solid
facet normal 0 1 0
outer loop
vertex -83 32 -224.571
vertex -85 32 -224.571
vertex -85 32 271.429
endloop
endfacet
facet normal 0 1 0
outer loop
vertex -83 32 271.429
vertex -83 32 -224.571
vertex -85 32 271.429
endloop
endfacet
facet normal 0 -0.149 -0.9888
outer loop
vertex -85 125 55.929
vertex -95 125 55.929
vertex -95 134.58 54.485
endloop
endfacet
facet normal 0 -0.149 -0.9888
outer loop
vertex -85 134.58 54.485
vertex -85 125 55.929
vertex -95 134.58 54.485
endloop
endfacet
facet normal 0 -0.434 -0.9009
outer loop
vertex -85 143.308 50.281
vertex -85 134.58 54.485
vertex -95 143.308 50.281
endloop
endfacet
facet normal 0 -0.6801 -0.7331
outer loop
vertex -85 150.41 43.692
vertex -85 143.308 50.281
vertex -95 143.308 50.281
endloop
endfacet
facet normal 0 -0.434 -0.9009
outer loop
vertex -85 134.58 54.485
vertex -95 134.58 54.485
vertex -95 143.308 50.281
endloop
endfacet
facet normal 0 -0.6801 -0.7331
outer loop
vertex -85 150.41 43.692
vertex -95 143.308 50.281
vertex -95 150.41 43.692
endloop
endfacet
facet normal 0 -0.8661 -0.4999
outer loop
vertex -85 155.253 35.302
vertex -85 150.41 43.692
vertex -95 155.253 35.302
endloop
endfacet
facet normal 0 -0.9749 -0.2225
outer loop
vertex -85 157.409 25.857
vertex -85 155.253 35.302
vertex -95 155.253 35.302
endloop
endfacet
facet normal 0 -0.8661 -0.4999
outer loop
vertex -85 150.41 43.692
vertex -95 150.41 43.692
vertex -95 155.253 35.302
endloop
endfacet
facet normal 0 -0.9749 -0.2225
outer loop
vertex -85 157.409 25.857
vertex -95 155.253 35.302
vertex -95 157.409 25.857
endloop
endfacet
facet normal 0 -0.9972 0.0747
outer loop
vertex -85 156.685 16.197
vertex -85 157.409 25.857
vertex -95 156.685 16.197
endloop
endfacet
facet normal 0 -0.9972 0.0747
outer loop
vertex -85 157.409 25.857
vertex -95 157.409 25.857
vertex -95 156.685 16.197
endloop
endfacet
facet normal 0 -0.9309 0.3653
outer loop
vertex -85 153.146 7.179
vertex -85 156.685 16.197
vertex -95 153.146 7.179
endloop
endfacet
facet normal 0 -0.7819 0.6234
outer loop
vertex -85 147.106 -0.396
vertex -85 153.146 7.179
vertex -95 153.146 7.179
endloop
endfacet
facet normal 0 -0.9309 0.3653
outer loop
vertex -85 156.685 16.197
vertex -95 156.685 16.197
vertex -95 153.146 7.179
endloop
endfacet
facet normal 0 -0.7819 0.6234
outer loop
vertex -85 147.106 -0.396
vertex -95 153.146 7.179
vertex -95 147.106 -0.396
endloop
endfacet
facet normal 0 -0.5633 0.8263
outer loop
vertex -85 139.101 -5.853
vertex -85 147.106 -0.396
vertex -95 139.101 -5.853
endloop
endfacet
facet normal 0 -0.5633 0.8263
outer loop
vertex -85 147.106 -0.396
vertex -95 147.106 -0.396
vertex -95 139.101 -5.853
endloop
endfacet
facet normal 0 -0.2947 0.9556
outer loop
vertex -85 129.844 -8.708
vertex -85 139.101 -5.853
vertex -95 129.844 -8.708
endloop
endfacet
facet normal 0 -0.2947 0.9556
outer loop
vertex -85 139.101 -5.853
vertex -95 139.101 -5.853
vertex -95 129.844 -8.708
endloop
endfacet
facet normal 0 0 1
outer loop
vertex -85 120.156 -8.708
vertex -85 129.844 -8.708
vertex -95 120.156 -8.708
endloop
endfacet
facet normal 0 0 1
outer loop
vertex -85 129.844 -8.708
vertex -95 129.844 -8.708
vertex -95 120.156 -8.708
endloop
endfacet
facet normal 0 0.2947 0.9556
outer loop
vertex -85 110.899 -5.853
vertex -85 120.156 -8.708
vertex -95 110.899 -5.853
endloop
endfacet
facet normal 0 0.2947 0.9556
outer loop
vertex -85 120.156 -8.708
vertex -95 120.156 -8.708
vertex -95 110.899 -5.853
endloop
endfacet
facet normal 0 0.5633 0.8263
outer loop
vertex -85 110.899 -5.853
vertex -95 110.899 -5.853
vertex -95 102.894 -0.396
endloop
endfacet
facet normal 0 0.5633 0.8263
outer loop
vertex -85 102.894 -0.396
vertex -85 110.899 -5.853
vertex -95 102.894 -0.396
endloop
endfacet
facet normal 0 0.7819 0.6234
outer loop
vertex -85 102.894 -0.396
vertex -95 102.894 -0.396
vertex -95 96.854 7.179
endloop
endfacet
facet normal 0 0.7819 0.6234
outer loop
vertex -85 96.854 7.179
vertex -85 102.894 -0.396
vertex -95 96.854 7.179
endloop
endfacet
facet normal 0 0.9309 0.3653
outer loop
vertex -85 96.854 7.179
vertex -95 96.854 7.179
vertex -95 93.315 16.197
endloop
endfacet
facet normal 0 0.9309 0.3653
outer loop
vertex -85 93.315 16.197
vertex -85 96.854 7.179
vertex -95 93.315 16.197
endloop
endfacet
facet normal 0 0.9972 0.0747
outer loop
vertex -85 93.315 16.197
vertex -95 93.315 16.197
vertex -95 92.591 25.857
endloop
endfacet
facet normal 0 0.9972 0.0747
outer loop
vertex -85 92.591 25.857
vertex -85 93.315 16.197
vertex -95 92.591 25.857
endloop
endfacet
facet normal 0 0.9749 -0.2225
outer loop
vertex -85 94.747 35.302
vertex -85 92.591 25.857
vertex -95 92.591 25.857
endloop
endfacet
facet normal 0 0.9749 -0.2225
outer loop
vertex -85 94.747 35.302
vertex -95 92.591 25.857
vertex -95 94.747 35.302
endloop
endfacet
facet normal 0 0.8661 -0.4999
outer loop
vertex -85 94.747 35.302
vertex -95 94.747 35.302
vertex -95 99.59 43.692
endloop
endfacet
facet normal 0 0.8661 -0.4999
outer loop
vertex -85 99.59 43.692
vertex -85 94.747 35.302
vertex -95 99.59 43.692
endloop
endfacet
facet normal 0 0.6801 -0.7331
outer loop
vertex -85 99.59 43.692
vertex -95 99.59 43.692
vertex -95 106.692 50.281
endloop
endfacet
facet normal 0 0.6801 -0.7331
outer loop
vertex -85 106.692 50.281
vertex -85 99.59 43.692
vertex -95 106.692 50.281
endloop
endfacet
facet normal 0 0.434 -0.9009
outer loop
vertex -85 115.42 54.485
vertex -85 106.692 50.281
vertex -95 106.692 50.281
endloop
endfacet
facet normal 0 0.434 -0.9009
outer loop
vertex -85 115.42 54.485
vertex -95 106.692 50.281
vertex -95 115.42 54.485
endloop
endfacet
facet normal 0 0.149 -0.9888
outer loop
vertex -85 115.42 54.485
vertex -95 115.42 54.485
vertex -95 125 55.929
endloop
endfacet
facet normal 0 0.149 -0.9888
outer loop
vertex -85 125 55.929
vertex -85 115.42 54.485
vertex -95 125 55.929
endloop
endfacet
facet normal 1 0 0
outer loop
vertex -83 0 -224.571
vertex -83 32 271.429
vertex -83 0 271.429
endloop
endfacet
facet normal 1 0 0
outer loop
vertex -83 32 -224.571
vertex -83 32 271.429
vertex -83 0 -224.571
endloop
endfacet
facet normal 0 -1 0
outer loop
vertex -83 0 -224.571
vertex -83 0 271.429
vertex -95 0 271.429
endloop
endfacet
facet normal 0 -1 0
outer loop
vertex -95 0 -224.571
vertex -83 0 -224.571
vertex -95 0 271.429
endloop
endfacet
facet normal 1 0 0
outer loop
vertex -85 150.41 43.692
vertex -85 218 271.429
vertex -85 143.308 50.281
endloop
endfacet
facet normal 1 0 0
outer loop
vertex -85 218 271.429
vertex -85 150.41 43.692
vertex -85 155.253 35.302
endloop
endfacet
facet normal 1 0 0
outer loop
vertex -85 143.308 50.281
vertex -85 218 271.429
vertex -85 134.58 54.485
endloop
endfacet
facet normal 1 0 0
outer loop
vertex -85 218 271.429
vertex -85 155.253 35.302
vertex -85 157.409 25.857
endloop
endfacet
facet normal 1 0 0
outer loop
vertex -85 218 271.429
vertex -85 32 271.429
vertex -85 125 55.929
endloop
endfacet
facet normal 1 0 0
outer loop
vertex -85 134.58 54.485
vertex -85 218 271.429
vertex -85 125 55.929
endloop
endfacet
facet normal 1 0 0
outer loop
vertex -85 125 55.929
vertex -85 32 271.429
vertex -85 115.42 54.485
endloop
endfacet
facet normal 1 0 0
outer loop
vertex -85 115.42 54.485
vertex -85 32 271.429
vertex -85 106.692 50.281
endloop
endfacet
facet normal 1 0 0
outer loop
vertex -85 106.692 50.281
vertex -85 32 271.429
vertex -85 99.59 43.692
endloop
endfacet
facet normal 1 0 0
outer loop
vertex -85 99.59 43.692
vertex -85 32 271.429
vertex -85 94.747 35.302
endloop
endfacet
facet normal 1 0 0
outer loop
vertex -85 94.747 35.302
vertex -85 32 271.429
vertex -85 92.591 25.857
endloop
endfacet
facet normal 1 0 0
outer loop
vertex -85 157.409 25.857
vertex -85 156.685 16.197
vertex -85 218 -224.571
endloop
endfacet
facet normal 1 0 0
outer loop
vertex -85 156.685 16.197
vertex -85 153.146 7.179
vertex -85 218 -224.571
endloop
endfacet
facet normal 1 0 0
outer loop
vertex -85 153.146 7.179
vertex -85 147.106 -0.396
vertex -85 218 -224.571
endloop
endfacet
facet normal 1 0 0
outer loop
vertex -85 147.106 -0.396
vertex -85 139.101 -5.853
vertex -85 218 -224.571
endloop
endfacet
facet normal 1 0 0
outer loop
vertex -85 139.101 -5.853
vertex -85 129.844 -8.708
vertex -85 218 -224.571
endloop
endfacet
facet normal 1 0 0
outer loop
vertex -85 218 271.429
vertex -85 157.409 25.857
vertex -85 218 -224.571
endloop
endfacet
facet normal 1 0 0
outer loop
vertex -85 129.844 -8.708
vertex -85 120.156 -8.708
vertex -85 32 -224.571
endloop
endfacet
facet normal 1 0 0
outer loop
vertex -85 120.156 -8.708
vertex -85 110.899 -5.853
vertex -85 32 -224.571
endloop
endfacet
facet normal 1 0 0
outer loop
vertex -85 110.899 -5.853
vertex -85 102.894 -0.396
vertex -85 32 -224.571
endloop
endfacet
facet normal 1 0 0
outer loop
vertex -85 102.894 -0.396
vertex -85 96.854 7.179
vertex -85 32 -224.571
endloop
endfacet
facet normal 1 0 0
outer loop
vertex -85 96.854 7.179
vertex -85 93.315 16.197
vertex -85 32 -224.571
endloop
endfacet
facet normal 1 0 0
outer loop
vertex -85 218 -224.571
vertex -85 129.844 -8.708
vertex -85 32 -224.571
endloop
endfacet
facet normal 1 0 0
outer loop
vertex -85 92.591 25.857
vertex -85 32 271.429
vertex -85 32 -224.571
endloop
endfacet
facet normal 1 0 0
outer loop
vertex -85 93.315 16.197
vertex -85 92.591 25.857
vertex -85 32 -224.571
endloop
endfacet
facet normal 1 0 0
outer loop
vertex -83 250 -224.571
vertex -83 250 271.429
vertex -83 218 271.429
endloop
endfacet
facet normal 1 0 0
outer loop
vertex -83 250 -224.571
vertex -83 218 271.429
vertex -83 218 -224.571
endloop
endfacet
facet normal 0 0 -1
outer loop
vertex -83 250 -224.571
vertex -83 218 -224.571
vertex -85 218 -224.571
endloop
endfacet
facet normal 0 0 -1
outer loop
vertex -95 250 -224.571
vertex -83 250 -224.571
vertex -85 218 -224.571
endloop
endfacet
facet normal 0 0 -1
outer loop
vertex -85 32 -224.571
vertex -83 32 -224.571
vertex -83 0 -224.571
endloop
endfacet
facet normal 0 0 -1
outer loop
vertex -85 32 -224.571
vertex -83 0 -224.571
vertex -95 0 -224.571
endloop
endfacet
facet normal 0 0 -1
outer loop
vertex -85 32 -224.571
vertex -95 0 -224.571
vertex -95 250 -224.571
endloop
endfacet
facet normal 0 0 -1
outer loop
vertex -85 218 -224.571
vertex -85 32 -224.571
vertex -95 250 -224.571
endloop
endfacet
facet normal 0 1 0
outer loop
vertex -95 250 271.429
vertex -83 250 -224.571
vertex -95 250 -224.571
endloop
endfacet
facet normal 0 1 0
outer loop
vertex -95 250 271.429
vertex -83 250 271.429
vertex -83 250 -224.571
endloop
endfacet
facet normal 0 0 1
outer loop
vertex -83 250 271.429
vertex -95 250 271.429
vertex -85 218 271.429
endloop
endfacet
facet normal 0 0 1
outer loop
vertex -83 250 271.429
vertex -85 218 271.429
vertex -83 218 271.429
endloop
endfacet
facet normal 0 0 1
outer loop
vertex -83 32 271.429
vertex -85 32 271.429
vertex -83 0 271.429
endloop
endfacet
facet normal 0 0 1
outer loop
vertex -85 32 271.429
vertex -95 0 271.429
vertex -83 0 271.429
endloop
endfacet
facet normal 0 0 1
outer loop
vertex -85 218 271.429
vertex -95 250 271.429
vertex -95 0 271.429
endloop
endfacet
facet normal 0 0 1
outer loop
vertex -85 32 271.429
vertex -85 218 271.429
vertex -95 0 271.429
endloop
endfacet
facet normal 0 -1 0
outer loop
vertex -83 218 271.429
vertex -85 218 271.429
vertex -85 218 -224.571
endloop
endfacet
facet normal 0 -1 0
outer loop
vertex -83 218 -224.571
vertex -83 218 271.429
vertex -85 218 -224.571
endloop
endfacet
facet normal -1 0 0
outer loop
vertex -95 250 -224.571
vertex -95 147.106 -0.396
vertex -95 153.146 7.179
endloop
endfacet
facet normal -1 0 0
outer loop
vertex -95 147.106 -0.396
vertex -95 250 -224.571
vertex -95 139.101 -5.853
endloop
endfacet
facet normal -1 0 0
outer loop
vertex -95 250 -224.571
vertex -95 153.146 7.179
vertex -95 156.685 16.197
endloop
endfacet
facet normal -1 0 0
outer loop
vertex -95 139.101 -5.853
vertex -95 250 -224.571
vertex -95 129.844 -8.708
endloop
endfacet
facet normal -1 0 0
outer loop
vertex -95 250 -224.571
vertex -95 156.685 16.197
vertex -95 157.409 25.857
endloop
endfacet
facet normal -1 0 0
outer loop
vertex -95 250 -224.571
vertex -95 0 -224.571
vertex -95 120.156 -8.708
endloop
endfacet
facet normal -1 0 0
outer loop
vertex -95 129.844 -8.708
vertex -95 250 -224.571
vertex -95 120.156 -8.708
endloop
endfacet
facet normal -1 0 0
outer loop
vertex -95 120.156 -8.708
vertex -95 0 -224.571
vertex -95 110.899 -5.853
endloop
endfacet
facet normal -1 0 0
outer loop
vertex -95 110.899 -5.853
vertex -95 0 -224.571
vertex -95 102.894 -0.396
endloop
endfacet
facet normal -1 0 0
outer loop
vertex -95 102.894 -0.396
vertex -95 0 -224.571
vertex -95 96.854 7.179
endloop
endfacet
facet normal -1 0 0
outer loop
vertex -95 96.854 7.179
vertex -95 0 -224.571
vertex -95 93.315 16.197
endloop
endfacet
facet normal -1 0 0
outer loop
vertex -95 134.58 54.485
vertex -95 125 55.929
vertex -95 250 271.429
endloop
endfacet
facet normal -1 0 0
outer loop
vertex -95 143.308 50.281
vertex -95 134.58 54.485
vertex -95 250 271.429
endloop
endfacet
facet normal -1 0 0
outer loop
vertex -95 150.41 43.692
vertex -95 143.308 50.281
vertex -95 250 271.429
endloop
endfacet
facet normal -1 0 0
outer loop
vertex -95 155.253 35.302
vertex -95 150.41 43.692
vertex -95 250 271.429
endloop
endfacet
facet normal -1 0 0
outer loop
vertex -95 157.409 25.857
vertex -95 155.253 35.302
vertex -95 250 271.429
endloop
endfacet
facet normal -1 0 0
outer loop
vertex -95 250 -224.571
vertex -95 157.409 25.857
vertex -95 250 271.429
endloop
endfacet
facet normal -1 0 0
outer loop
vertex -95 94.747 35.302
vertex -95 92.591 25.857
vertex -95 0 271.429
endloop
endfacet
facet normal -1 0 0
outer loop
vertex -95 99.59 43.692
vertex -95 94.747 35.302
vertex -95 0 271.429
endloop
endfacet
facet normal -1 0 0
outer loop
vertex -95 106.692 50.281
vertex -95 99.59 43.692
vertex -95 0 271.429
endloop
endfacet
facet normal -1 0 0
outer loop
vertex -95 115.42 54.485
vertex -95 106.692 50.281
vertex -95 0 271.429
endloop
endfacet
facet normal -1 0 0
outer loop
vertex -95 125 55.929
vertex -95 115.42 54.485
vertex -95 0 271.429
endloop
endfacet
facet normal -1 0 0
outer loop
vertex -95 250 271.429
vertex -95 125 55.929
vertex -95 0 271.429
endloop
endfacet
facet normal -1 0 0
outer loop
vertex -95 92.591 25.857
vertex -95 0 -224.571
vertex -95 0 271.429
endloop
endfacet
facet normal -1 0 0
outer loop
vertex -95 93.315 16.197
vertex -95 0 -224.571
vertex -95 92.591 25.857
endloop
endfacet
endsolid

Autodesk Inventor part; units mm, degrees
ref_plane "YZ Plane" through (0, 0, 0) normal (1, 0, 0) x (0, 1, 0)
ref_plane "XZ Plane" through (0, 0, 0) normal (0, 1, 0) x (-1, 0, 0)
ref_plane "XY Plane" through (0, 0, 0) normal (0, 0, 1) x (1, 0, 0)
sketch "Sketch1" plane through (0, 0, 0) normal (0, 1, 0) x (-1, 0, 0)
  line L0 (95, 271.4286) -> (85, 271.4286)
  line L1 (85, 271.4286) -> (85, -224.5714)
  line L2 (85, -224.5714) -> (95, -224.5714)
  line L3 (95, -224.5714) -> (95, 271.4286)
  point P0 (0, 0)
  dimension "d0" = 10
  dimension "d1" = 496
extrude "Extrusion1" add sketch "Sketch1" along normal blind 250
sketch "Sketch2" plane through (-85, 0, 271.4286) normal (1, 0, 0) x (0, 0, -1)
  line L0 (0, 0) -> (0, 250) projected
  line L1 (496, 0) -> (496, 250) projected
  line L2 (0, 218) -> (496, 218)
  line L3 (496, 218) -> (496, 32)
  line L4 (496, 32) -> (0, 32)
  line L5 (0, 32) -> (0, 218)
  line L6 (0, 250) -> (496, 250) projected
  line L7 (0, 0) -> (496, 0) projected
  point P0 (271.4286, 0)
  point P1 (0, 32)
  point P2 (496, 218)
  dimension "d4" = 32
  dimension "d5" = 32
  dimension "d6" = 186
extrude "Extrusion3" add sketch "Sketch2" along normal blind 2 contours L0 L4 L1 L7 | L0 L6 L1 L2
sketch "Sketch3" plane through (-95, 0, -224.5714) normal (-1, 0, 0) x (0, 0, 1)
  line L0 (0, 250) -> (496, 250) projected
  circle A0 centre (248, 250) radius 8
  line L1 (496, 32) -> (496, 218) projected
  circle A1 centre (496, 125) radius 12
  circle A2 centre (248, 125) radius 32.5
  point P0 (224.5714, 0)
  dimension "d11" = 65
extrude "Extrusion4" cut sketch "Sketch3" against normal blind 35 contours A2
properties part number "Osnova" material "Aluminum 6061"
